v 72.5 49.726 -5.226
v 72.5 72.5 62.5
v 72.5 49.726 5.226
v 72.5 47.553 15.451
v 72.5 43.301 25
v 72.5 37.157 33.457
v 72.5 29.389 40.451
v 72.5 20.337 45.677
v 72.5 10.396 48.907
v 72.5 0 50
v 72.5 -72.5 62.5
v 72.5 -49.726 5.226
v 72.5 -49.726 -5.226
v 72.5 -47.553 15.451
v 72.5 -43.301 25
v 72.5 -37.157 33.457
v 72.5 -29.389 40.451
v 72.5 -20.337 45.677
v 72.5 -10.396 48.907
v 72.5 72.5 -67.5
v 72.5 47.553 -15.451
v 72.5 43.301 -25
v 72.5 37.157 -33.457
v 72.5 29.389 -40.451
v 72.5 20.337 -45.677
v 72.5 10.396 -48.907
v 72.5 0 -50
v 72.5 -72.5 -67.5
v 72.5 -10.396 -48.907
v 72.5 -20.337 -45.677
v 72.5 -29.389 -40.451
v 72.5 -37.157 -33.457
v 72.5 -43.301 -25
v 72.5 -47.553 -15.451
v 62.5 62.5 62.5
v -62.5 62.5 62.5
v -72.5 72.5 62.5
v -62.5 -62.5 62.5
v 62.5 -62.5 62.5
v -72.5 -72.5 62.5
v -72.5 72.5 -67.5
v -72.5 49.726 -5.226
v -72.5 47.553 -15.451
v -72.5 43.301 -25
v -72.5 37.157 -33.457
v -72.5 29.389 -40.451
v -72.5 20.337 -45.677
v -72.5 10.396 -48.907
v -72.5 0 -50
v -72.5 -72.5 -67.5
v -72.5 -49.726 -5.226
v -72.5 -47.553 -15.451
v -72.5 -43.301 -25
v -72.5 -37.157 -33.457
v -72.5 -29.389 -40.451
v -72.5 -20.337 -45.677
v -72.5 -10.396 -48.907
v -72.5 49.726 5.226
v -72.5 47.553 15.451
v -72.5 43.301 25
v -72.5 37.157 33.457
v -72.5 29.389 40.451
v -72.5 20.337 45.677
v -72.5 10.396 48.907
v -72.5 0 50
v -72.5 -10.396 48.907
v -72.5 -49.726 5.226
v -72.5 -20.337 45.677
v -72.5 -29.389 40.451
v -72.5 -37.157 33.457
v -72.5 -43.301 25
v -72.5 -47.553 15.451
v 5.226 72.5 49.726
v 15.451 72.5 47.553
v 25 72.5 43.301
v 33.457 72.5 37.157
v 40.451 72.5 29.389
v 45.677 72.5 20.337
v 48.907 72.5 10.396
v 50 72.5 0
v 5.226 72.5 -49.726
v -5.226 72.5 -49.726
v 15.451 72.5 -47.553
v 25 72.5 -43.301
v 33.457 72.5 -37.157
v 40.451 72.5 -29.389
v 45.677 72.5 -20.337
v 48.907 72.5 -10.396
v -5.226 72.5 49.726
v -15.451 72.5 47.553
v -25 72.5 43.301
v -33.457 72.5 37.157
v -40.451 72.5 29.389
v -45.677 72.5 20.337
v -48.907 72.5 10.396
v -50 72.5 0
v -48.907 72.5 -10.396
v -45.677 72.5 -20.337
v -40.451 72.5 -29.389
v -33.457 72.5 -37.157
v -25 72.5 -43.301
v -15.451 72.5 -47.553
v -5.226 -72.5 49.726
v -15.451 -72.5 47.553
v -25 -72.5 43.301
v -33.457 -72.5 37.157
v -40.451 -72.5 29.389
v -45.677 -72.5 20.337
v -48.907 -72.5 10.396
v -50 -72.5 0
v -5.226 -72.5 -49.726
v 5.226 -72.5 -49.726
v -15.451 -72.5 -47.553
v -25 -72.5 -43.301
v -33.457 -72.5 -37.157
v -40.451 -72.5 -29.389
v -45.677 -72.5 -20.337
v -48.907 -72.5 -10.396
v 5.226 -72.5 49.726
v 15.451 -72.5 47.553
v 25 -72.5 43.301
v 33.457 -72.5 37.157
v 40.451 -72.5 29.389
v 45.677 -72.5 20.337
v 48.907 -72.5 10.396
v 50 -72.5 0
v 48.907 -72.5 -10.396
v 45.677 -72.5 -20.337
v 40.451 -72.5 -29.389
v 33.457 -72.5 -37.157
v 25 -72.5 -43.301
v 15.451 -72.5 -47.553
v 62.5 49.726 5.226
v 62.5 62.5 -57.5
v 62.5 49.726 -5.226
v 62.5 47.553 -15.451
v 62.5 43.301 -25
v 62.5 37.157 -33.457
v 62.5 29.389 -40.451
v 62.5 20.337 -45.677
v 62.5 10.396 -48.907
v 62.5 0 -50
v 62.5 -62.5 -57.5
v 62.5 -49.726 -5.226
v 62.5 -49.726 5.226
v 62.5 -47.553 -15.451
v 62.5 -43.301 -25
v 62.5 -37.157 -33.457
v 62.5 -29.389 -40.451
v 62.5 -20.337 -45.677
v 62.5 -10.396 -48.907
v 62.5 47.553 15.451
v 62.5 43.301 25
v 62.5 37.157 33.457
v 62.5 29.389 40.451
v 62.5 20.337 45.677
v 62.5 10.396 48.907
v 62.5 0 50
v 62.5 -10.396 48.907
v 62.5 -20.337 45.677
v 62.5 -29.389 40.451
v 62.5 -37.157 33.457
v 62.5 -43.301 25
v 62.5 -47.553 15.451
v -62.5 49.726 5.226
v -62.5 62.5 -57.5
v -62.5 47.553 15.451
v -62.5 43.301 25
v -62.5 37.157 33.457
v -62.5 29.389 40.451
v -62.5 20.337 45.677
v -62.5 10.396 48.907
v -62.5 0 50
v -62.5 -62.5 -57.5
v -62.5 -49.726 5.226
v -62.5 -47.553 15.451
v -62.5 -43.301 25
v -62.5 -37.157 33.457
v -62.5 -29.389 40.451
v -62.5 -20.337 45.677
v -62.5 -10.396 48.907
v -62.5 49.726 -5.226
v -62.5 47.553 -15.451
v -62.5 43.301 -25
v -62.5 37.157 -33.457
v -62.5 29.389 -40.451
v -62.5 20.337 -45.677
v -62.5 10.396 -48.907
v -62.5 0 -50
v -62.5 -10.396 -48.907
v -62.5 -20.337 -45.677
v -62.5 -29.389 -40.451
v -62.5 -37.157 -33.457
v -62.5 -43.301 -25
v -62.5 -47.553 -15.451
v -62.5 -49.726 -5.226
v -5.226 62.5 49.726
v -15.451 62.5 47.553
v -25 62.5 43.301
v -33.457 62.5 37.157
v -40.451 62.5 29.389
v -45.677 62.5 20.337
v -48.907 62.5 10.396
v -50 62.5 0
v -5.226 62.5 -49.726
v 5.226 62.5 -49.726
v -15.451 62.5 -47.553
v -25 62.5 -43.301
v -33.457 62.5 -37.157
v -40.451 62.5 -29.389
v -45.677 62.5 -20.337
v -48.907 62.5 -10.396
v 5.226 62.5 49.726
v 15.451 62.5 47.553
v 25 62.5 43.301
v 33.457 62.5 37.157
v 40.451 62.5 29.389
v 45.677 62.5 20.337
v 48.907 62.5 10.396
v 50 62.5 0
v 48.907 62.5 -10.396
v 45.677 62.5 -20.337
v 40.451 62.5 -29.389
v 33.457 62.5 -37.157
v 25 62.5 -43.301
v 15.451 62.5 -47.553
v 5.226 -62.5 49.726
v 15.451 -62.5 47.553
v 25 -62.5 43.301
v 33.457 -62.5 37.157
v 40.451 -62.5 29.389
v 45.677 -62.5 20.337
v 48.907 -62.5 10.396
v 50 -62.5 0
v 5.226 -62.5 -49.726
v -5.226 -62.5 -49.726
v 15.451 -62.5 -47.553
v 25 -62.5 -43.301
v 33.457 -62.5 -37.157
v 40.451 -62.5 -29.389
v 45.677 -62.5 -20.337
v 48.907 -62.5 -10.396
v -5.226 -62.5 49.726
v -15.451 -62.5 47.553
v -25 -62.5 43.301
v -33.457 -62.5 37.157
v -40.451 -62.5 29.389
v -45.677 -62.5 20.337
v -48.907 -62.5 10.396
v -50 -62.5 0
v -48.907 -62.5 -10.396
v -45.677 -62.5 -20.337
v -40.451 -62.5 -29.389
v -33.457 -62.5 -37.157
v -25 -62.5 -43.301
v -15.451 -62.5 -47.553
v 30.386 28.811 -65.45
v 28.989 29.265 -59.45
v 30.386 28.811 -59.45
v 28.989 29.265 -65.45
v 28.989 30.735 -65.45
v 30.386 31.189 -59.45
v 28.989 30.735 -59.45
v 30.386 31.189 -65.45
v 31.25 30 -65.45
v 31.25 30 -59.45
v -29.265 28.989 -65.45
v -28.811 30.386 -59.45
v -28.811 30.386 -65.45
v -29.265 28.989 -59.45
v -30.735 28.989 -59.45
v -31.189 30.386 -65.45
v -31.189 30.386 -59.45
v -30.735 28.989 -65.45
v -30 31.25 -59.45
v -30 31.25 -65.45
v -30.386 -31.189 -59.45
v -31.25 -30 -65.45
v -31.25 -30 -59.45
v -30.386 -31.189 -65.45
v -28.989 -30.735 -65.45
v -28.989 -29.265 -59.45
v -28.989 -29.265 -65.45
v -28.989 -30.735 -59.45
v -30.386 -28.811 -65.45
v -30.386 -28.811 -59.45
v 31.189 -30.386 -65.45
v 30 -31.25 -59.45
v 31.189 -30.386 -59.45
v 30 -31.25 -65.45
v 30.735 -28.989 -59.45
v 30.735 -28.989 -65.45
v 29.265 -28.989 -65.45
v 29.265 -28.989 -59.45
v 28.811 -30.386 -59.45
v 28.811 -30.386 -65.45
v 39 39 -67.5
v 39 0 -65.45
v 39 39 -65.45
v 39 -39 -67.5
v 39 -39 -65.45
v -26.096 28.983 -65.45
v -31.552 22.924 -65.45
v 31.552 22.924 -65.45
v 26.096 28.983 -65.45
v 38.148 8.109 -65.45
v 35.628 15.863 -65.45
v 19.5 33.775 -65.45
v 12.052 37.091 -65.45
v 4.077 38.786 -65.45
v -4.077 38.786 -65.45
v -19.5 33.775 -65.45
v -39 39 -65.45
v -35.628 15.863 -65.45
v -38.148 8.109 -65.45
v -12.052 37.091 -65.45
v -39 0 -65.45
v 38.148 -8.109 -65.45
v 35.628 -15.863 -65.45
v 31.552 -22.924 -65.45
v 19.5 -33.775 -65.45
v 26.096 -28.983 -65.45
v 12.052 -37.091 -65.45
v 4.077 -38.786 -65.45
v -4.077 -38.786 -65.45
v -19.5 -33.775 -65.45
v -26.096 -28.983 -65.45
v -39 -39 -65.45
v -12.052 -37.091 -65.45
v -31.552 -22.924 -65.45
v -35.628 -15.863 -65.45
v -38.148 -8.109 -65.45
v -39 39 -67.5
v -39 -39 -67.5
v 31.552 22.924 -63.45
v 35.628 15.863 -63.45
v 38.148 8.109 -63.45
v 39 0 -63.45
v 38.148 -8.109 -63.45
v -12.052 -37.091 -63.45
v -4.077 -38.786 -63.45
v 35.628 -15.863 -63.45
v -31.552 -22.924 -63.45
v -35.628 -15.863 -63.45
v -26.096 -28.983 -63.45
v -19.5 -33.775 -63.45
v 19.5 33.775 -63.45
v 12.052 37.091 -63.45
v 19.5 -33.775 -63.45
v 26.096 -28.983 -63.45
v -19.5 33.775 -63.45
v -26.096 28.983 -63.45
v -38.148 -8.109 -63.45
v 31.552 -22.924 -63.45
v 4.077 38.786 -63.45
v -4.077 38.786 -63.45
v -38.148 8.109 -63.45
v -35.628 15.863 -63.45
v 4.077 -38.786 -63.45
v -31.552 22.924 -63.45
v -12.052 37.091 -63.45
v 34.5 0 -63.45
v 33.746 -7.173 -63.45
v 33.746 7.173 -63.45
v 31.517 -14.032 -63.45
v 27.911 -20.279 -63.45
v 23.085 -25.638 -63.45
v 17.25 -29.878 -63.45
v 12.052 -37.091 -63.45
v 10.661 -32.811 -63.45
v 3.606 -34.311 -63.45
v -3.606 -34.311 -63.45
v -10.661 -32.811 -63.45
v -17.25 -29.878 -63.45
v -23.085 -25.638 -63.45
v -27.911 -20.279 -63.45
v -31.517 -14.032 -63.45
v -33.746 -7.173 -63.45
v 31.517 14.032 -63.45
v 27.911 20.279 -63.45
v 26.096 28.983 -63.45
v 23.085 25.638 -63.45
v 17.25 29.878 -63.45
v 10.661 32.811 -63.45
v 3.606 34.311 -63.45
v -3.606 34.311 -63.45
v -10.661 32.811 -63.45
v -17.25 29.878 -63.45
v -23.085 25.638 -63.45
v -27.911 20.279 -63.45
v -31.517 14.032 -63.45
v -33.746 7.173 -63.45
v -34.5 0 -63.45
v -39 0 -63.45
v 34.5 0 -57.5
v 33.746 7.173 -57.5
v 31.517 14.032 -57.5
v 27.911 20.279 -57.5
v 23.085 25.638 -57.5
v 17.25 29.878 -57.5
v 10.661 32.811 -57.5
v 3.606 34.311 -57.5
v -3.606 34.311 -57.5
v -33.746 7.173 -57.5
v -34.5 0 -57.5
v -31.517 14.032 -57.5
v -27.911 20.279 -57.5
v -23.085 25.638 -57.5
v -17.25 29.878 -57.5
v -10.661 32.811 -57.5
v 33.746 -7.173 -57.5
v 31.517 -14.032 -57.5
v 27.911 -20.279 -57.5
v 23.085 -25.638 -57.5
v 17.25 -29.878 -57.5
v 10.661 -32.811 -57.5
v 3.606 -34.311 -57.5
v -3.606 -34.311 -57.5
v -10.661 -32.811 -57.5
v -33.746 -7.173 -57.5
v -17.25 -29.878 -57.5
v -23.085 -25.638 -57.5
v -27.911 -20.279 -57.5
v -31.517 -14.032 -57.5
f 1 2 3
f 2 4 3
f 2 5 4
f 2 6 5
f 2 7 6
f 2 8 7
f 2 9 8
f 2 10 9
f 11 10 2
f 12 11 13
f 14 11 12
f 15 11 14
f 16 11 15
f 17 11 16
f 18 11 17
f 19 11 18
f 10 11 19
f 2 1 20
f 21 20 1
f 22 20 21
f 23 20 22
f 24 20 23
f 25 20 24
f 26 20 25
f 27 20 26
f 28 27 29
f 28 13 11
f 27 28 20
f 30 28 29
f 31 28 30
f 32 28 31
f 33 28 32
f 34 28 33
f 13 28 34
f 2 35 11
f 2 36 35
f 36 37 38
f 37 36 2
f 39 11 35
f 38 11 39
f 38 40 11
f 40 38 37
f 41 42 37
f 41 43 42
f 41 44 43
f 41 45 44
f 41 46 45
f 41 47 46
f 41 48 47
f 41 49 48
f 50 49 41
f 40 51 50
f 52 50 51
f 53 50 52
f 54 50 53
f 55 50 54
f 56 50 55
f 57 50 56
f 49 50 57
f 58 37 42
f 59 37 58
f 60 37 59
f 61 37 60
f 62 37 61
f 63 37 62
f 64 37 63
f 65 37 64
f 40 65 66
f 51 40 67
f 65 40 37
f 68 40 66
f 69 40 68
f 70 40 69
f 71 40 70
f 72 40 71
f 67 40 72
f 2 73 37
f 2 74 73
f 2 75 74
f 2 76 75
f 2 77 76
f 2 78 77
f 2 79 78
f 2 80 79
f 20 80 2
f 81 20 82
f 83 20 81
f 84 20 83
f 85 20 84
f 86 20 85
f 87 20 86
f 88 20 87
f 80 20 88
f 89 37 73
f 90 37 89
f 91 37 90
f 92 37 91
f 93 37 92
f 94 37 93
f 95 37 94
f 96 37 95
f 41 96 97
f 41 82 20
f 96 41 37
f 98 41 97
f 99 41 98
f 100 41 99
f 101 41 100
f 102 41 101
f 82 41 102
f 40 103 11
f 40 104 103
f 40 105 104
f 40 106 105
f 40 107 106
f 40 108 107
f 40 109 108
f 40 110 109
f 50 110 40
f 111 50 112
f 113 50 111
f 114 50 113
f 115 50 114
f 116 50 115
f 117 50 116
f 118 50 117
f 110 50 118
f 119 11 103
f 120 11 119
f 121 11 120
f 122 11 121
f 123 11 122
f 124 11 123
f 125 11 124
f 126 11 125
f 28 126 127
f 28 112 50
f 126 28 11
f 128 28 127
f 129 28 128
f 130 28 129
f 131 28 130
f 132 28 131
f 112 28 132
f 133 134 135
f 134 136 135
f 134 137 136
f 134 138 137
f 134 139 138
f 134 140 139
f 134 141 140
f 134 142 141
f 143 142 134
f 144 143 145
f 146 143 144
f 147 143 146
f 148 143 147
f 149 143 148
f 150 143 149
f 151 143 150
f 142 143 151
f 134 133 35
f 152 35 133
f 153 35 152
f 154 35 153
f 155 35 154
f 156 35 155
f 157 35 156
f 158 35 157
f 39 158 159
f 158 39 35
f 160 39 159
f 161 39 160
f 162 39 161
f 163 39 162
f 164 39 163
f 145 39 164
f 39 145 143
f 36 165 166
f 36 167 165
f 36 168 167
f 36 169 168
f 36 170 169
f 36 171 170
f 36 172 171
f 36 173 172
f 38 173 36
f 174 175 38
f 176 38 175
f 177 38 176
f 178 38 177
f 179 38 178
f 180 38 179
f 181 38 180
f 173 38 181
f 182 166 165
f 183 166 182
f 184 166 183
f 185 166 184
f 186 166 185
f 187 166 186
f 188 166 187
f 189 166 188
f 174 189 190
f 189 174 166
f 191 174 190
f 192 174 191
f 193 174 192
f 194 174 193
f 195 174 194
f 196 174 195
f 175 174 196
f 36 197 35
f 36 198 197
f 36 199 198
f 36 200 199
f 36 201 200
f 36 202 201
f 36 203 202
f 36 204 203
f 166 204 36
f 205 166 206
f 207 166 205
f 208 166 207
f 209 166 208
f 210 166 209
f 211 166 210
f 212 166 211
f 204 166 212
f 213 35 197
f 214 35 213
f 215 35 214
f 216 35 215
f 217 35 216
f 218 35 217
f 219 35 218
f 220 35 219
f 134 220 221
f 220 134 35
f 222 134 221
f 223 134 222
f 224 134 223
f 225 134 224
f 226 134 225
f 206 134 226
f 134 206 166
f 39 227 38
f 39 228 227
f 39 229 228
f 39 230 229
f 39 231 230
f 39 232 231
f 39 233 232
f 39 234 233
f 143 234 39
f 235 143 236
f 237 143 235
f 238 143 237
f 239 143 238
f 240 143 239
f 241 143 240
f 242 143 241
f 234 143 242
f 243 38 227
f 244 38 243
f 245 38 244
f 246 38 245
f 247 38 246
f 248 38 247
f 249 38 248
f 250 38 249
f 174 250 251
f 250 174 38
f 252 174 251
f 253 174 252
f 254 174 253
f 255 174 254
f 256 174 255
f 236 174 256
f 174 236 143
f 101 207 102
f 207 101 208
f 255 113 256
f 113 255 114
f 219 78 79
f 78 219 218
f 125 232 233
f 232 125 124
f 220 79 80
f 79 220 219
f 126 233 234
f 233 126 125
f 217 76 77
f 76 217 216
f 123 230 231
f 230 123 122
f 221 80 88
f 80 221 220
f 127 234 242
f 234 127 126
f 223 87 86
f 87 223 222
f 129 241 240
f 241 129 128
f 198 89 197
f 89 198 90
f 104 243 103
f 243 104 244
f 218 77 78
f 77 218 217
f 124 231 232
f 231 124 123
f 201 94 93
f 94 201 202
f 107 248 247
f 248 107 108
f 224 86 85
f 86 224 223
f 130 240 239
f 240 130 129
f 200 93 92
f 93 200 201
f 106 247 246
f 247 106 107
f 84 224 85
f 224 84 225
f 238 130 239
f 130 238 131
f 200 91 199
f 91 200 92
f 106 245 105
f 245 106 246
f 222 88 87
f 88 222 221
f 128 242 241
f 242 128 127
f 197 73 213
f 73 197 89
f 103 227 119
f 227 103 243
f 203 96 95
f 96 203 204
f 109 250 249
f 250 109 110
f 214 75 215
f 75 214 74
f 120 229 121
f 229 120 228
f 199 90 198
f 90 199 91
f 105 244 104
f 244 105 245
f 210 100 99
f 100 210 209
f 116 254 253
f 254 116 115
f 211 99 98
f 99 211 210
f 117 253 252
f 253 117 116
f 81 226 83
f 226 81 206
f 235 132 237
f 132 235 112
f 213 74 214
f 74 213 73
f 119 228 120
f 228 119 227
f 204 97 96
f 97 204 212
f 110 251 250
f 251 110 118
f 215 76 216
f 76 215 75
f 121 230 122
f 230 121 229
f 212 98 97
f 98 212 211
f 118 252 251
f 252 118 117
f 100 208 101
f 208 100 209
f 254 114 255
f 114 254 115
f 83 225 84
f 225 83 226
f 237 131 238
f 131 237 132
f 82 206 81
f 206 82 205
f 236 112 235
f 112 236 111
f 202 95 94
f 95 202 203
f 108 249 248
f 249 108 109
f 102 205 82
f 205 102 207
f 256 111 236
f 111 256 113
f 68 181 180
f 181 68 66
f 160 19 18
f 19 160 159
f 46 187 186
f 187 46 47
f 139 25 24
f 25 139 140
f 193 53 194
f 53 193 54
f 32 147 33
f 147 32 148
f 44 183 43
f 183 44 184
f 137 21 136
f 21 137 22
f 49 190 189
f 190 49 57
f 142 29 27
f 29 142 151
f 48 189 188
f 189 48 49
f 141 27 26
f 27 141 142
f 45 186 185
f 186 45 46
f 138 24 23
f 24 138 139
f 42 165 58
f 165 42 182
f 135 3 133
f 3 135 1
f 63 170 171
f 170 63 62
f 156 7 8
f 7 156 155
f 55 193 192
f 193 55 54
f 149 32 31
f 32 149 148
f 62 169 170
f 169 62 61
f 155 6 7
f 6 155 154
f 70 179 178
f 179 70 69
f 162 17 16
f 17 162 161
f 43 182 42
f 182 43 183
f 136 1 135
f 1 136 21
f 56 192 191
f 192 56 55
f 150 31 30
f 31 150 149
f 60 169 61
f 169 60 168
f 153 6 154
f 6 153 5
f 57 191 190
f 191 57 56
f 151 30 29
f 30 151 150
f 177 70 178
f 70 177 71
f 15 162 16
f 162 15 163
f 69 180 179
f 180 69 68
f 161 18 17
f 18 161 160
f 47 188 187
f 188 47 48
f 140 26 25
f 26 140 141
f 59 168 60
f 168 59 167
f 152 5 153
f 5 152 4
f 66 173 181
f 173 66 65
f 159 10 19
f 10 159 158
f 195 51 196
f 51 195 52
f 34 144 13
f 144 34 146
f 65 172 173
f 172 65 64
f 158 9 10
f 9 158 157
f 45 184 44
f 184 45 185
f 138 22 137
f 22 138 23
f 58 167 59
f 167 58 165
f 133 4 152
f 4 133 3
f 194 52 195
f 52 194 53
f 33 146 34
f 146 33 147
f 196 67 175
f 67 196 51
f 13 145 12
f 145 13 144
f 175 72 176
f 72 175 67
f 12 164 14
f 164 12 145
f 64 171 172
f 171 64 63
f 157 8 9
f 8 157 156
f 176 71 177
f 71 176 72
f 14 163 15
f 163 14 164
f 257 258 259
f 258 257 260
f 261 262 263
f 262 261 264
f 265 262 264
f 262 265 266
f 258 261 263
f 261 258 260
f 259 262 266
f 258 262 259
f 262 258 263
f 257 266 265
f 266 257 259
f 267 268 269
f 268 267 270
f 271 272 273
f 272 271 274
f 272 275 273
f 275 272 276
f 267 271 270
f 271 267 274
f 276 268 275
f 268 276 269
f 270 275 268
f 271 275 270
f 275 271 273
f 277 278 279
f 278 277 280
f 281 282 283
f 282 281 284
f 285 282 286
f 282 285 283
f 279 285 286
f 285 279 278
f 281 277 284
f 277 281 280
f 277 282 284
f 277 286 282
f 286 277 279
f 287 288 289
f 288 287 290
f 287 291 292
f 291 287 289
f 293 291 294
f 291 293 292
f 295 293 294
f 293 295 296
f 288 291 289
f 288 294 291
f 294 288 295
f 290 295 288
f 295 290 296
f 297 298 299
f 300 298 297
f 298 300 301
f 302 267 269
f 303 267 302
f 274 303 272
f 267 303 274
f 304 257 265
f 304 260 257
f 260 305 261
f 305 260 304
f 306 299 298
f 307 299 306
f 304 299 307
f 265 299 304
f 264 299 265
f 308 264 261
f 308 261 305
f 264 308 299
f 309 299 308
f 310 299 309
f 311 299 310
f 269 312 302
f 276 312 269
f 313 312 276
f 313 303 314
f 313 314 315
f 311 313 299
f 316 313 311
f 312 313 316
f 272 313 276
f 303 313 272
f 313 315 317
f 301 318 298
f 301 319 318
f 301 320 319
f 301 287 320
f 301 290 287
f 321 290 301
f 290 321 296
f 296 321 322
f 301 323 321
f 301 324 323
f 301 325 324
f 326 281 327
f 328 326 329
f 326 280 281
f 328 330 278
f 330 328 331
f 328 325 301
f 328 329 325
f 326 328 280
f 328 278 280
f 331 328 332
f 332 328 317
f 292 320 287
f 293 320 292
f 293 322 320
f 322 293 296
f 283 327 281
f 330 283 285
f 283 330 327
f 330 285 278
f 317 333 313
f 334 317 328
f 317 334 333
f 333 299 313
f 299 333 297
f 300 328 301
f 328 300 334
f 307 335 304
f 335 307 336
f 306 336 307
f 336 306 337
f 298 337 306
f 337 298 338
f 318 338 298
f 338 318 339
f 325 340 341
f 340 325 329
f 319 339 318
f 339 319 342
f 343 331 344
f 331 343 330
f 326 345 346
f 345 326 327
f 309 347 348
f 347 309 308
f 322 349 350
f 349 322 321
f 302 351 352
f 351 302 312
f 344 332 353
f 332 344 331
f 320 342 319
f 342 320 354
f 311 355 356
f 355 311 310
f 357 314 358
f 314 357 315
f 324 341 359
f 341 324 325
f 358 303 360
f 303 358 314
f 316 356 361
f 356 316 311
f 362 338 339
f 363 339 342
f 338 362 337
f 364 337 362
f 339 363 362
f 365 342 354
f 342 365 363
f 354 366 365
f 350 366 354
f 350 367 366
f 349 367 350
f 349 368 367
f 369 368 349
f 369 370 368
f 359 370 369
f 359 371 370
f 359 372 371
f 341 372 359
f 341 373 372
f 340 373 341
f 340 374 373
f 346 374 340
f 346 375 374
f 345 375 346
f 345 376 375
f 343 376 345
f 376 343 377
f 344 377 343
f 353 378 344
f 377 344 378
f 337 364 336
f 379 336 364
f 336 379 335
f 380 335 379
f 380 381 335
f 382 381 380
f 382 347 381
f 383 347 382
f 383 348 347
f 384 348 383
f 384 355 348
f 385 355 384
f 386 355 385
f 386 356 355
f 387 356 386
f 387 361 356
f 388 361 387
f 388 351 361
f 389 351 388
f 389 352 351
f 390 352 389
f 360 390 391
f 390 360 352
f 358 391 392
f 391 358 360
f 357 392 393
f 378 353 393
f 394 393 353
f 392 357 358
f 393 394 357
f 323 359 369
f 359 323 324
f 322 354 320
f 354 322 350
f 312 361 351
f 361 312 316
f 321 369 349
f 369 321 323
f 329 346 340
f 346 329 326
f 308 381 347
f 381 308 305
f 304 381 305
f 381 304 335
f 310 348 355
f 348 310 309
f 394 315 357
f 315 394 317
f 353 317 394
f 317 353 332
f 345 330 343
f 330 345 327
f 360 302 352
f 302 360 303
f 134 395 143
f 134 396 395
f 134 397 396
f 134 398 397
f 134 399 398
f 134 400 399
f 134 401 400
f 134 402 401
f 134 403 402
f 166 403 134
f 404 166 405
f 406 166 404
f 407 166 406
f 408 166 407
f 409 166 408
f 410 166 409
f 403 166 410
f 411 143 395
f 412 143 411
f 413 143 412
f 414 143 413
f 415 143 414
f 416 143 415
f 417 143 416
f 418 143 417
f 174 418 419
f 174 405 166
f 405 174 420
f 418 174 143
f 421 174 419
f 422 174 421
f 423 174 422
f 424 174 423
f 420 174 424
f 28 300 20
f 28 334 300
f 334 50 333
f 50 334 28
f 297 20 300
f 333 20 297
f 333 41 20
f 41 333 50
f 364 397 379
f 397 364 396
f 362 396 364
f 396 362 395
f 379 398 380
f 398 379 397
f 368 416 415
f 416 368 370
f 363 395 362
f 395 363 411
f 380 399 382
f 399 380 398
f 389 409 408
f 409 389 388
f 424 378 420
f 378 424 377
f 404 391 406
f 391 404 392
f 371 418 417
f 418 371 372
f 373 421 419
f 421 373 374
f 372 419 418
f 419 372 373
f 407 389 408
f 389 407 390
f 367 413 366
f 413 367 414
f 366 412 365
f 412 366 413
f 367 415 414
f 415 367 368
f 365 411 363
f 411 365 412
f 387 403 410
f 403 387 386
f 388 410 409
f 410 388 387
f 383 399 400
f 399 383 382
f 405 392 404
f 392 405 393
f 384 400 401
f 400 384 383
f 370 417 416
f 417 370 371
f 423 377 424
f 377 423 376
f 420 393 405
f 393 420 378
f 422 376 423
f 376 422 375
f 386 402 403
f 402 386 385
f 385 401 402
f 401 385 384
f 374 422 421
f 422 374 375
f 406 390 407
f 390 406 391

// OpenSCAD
tol=0.1;    // [mm]
Ds  = 69;   // speaker
DsH =2.5;   // holes
SQs = 78;   // square
SQh = 60;     // sq for holes
Dm  =100;   // membrane
perf = 4;   // perforations
width=10;   // thickness
xlen = 1.25*Dm;
ylen = 1.25*Dm;
zlen = 1.25*Dm;

difference()
{
    cube([xlen+2*width, ylen+2*width, zlen],center = true);
    
    cube([xlen, ylen, zlen+tol], center = true);
    
    rotate([90,0,0])
    {
        cylinder(h=ylen+2*width+tol, d=Dm, center=true);
        difference()
        {
           
               
        }
    }
    rotate([0,90,0])
    {
        cylinder(h=xlen+2*width+tol, d=Dm, center=true);
    }
    
    rotate([0,90,0])
    {
        cylinder(h=xlen+2*width+tol, d=Dm, center=true);
    }
}

translate([0,0,-zlen/2])
{
    difference()
    {
        cube([xlen+2*width,ylen+2*width,width],center=true);
        
        cylinder(h=width+tol, d=Ds, center=true);
        translate([0,0,(-width)/2])
        {
            cube([SQs,SQs,perf+tol],center=true);
            cylinder(h=2*perf+tol, d=SQs, center=true);
            
            for(i=[0:90:270])
            {
                rotate([0,0,i])
                {
                    translate([SQh/2,SQh/2,0])
                    {
                        cylinder(h=4*perf+tol, d=DsH, center=true);
                    }
                }
            }
        }
    }
}
